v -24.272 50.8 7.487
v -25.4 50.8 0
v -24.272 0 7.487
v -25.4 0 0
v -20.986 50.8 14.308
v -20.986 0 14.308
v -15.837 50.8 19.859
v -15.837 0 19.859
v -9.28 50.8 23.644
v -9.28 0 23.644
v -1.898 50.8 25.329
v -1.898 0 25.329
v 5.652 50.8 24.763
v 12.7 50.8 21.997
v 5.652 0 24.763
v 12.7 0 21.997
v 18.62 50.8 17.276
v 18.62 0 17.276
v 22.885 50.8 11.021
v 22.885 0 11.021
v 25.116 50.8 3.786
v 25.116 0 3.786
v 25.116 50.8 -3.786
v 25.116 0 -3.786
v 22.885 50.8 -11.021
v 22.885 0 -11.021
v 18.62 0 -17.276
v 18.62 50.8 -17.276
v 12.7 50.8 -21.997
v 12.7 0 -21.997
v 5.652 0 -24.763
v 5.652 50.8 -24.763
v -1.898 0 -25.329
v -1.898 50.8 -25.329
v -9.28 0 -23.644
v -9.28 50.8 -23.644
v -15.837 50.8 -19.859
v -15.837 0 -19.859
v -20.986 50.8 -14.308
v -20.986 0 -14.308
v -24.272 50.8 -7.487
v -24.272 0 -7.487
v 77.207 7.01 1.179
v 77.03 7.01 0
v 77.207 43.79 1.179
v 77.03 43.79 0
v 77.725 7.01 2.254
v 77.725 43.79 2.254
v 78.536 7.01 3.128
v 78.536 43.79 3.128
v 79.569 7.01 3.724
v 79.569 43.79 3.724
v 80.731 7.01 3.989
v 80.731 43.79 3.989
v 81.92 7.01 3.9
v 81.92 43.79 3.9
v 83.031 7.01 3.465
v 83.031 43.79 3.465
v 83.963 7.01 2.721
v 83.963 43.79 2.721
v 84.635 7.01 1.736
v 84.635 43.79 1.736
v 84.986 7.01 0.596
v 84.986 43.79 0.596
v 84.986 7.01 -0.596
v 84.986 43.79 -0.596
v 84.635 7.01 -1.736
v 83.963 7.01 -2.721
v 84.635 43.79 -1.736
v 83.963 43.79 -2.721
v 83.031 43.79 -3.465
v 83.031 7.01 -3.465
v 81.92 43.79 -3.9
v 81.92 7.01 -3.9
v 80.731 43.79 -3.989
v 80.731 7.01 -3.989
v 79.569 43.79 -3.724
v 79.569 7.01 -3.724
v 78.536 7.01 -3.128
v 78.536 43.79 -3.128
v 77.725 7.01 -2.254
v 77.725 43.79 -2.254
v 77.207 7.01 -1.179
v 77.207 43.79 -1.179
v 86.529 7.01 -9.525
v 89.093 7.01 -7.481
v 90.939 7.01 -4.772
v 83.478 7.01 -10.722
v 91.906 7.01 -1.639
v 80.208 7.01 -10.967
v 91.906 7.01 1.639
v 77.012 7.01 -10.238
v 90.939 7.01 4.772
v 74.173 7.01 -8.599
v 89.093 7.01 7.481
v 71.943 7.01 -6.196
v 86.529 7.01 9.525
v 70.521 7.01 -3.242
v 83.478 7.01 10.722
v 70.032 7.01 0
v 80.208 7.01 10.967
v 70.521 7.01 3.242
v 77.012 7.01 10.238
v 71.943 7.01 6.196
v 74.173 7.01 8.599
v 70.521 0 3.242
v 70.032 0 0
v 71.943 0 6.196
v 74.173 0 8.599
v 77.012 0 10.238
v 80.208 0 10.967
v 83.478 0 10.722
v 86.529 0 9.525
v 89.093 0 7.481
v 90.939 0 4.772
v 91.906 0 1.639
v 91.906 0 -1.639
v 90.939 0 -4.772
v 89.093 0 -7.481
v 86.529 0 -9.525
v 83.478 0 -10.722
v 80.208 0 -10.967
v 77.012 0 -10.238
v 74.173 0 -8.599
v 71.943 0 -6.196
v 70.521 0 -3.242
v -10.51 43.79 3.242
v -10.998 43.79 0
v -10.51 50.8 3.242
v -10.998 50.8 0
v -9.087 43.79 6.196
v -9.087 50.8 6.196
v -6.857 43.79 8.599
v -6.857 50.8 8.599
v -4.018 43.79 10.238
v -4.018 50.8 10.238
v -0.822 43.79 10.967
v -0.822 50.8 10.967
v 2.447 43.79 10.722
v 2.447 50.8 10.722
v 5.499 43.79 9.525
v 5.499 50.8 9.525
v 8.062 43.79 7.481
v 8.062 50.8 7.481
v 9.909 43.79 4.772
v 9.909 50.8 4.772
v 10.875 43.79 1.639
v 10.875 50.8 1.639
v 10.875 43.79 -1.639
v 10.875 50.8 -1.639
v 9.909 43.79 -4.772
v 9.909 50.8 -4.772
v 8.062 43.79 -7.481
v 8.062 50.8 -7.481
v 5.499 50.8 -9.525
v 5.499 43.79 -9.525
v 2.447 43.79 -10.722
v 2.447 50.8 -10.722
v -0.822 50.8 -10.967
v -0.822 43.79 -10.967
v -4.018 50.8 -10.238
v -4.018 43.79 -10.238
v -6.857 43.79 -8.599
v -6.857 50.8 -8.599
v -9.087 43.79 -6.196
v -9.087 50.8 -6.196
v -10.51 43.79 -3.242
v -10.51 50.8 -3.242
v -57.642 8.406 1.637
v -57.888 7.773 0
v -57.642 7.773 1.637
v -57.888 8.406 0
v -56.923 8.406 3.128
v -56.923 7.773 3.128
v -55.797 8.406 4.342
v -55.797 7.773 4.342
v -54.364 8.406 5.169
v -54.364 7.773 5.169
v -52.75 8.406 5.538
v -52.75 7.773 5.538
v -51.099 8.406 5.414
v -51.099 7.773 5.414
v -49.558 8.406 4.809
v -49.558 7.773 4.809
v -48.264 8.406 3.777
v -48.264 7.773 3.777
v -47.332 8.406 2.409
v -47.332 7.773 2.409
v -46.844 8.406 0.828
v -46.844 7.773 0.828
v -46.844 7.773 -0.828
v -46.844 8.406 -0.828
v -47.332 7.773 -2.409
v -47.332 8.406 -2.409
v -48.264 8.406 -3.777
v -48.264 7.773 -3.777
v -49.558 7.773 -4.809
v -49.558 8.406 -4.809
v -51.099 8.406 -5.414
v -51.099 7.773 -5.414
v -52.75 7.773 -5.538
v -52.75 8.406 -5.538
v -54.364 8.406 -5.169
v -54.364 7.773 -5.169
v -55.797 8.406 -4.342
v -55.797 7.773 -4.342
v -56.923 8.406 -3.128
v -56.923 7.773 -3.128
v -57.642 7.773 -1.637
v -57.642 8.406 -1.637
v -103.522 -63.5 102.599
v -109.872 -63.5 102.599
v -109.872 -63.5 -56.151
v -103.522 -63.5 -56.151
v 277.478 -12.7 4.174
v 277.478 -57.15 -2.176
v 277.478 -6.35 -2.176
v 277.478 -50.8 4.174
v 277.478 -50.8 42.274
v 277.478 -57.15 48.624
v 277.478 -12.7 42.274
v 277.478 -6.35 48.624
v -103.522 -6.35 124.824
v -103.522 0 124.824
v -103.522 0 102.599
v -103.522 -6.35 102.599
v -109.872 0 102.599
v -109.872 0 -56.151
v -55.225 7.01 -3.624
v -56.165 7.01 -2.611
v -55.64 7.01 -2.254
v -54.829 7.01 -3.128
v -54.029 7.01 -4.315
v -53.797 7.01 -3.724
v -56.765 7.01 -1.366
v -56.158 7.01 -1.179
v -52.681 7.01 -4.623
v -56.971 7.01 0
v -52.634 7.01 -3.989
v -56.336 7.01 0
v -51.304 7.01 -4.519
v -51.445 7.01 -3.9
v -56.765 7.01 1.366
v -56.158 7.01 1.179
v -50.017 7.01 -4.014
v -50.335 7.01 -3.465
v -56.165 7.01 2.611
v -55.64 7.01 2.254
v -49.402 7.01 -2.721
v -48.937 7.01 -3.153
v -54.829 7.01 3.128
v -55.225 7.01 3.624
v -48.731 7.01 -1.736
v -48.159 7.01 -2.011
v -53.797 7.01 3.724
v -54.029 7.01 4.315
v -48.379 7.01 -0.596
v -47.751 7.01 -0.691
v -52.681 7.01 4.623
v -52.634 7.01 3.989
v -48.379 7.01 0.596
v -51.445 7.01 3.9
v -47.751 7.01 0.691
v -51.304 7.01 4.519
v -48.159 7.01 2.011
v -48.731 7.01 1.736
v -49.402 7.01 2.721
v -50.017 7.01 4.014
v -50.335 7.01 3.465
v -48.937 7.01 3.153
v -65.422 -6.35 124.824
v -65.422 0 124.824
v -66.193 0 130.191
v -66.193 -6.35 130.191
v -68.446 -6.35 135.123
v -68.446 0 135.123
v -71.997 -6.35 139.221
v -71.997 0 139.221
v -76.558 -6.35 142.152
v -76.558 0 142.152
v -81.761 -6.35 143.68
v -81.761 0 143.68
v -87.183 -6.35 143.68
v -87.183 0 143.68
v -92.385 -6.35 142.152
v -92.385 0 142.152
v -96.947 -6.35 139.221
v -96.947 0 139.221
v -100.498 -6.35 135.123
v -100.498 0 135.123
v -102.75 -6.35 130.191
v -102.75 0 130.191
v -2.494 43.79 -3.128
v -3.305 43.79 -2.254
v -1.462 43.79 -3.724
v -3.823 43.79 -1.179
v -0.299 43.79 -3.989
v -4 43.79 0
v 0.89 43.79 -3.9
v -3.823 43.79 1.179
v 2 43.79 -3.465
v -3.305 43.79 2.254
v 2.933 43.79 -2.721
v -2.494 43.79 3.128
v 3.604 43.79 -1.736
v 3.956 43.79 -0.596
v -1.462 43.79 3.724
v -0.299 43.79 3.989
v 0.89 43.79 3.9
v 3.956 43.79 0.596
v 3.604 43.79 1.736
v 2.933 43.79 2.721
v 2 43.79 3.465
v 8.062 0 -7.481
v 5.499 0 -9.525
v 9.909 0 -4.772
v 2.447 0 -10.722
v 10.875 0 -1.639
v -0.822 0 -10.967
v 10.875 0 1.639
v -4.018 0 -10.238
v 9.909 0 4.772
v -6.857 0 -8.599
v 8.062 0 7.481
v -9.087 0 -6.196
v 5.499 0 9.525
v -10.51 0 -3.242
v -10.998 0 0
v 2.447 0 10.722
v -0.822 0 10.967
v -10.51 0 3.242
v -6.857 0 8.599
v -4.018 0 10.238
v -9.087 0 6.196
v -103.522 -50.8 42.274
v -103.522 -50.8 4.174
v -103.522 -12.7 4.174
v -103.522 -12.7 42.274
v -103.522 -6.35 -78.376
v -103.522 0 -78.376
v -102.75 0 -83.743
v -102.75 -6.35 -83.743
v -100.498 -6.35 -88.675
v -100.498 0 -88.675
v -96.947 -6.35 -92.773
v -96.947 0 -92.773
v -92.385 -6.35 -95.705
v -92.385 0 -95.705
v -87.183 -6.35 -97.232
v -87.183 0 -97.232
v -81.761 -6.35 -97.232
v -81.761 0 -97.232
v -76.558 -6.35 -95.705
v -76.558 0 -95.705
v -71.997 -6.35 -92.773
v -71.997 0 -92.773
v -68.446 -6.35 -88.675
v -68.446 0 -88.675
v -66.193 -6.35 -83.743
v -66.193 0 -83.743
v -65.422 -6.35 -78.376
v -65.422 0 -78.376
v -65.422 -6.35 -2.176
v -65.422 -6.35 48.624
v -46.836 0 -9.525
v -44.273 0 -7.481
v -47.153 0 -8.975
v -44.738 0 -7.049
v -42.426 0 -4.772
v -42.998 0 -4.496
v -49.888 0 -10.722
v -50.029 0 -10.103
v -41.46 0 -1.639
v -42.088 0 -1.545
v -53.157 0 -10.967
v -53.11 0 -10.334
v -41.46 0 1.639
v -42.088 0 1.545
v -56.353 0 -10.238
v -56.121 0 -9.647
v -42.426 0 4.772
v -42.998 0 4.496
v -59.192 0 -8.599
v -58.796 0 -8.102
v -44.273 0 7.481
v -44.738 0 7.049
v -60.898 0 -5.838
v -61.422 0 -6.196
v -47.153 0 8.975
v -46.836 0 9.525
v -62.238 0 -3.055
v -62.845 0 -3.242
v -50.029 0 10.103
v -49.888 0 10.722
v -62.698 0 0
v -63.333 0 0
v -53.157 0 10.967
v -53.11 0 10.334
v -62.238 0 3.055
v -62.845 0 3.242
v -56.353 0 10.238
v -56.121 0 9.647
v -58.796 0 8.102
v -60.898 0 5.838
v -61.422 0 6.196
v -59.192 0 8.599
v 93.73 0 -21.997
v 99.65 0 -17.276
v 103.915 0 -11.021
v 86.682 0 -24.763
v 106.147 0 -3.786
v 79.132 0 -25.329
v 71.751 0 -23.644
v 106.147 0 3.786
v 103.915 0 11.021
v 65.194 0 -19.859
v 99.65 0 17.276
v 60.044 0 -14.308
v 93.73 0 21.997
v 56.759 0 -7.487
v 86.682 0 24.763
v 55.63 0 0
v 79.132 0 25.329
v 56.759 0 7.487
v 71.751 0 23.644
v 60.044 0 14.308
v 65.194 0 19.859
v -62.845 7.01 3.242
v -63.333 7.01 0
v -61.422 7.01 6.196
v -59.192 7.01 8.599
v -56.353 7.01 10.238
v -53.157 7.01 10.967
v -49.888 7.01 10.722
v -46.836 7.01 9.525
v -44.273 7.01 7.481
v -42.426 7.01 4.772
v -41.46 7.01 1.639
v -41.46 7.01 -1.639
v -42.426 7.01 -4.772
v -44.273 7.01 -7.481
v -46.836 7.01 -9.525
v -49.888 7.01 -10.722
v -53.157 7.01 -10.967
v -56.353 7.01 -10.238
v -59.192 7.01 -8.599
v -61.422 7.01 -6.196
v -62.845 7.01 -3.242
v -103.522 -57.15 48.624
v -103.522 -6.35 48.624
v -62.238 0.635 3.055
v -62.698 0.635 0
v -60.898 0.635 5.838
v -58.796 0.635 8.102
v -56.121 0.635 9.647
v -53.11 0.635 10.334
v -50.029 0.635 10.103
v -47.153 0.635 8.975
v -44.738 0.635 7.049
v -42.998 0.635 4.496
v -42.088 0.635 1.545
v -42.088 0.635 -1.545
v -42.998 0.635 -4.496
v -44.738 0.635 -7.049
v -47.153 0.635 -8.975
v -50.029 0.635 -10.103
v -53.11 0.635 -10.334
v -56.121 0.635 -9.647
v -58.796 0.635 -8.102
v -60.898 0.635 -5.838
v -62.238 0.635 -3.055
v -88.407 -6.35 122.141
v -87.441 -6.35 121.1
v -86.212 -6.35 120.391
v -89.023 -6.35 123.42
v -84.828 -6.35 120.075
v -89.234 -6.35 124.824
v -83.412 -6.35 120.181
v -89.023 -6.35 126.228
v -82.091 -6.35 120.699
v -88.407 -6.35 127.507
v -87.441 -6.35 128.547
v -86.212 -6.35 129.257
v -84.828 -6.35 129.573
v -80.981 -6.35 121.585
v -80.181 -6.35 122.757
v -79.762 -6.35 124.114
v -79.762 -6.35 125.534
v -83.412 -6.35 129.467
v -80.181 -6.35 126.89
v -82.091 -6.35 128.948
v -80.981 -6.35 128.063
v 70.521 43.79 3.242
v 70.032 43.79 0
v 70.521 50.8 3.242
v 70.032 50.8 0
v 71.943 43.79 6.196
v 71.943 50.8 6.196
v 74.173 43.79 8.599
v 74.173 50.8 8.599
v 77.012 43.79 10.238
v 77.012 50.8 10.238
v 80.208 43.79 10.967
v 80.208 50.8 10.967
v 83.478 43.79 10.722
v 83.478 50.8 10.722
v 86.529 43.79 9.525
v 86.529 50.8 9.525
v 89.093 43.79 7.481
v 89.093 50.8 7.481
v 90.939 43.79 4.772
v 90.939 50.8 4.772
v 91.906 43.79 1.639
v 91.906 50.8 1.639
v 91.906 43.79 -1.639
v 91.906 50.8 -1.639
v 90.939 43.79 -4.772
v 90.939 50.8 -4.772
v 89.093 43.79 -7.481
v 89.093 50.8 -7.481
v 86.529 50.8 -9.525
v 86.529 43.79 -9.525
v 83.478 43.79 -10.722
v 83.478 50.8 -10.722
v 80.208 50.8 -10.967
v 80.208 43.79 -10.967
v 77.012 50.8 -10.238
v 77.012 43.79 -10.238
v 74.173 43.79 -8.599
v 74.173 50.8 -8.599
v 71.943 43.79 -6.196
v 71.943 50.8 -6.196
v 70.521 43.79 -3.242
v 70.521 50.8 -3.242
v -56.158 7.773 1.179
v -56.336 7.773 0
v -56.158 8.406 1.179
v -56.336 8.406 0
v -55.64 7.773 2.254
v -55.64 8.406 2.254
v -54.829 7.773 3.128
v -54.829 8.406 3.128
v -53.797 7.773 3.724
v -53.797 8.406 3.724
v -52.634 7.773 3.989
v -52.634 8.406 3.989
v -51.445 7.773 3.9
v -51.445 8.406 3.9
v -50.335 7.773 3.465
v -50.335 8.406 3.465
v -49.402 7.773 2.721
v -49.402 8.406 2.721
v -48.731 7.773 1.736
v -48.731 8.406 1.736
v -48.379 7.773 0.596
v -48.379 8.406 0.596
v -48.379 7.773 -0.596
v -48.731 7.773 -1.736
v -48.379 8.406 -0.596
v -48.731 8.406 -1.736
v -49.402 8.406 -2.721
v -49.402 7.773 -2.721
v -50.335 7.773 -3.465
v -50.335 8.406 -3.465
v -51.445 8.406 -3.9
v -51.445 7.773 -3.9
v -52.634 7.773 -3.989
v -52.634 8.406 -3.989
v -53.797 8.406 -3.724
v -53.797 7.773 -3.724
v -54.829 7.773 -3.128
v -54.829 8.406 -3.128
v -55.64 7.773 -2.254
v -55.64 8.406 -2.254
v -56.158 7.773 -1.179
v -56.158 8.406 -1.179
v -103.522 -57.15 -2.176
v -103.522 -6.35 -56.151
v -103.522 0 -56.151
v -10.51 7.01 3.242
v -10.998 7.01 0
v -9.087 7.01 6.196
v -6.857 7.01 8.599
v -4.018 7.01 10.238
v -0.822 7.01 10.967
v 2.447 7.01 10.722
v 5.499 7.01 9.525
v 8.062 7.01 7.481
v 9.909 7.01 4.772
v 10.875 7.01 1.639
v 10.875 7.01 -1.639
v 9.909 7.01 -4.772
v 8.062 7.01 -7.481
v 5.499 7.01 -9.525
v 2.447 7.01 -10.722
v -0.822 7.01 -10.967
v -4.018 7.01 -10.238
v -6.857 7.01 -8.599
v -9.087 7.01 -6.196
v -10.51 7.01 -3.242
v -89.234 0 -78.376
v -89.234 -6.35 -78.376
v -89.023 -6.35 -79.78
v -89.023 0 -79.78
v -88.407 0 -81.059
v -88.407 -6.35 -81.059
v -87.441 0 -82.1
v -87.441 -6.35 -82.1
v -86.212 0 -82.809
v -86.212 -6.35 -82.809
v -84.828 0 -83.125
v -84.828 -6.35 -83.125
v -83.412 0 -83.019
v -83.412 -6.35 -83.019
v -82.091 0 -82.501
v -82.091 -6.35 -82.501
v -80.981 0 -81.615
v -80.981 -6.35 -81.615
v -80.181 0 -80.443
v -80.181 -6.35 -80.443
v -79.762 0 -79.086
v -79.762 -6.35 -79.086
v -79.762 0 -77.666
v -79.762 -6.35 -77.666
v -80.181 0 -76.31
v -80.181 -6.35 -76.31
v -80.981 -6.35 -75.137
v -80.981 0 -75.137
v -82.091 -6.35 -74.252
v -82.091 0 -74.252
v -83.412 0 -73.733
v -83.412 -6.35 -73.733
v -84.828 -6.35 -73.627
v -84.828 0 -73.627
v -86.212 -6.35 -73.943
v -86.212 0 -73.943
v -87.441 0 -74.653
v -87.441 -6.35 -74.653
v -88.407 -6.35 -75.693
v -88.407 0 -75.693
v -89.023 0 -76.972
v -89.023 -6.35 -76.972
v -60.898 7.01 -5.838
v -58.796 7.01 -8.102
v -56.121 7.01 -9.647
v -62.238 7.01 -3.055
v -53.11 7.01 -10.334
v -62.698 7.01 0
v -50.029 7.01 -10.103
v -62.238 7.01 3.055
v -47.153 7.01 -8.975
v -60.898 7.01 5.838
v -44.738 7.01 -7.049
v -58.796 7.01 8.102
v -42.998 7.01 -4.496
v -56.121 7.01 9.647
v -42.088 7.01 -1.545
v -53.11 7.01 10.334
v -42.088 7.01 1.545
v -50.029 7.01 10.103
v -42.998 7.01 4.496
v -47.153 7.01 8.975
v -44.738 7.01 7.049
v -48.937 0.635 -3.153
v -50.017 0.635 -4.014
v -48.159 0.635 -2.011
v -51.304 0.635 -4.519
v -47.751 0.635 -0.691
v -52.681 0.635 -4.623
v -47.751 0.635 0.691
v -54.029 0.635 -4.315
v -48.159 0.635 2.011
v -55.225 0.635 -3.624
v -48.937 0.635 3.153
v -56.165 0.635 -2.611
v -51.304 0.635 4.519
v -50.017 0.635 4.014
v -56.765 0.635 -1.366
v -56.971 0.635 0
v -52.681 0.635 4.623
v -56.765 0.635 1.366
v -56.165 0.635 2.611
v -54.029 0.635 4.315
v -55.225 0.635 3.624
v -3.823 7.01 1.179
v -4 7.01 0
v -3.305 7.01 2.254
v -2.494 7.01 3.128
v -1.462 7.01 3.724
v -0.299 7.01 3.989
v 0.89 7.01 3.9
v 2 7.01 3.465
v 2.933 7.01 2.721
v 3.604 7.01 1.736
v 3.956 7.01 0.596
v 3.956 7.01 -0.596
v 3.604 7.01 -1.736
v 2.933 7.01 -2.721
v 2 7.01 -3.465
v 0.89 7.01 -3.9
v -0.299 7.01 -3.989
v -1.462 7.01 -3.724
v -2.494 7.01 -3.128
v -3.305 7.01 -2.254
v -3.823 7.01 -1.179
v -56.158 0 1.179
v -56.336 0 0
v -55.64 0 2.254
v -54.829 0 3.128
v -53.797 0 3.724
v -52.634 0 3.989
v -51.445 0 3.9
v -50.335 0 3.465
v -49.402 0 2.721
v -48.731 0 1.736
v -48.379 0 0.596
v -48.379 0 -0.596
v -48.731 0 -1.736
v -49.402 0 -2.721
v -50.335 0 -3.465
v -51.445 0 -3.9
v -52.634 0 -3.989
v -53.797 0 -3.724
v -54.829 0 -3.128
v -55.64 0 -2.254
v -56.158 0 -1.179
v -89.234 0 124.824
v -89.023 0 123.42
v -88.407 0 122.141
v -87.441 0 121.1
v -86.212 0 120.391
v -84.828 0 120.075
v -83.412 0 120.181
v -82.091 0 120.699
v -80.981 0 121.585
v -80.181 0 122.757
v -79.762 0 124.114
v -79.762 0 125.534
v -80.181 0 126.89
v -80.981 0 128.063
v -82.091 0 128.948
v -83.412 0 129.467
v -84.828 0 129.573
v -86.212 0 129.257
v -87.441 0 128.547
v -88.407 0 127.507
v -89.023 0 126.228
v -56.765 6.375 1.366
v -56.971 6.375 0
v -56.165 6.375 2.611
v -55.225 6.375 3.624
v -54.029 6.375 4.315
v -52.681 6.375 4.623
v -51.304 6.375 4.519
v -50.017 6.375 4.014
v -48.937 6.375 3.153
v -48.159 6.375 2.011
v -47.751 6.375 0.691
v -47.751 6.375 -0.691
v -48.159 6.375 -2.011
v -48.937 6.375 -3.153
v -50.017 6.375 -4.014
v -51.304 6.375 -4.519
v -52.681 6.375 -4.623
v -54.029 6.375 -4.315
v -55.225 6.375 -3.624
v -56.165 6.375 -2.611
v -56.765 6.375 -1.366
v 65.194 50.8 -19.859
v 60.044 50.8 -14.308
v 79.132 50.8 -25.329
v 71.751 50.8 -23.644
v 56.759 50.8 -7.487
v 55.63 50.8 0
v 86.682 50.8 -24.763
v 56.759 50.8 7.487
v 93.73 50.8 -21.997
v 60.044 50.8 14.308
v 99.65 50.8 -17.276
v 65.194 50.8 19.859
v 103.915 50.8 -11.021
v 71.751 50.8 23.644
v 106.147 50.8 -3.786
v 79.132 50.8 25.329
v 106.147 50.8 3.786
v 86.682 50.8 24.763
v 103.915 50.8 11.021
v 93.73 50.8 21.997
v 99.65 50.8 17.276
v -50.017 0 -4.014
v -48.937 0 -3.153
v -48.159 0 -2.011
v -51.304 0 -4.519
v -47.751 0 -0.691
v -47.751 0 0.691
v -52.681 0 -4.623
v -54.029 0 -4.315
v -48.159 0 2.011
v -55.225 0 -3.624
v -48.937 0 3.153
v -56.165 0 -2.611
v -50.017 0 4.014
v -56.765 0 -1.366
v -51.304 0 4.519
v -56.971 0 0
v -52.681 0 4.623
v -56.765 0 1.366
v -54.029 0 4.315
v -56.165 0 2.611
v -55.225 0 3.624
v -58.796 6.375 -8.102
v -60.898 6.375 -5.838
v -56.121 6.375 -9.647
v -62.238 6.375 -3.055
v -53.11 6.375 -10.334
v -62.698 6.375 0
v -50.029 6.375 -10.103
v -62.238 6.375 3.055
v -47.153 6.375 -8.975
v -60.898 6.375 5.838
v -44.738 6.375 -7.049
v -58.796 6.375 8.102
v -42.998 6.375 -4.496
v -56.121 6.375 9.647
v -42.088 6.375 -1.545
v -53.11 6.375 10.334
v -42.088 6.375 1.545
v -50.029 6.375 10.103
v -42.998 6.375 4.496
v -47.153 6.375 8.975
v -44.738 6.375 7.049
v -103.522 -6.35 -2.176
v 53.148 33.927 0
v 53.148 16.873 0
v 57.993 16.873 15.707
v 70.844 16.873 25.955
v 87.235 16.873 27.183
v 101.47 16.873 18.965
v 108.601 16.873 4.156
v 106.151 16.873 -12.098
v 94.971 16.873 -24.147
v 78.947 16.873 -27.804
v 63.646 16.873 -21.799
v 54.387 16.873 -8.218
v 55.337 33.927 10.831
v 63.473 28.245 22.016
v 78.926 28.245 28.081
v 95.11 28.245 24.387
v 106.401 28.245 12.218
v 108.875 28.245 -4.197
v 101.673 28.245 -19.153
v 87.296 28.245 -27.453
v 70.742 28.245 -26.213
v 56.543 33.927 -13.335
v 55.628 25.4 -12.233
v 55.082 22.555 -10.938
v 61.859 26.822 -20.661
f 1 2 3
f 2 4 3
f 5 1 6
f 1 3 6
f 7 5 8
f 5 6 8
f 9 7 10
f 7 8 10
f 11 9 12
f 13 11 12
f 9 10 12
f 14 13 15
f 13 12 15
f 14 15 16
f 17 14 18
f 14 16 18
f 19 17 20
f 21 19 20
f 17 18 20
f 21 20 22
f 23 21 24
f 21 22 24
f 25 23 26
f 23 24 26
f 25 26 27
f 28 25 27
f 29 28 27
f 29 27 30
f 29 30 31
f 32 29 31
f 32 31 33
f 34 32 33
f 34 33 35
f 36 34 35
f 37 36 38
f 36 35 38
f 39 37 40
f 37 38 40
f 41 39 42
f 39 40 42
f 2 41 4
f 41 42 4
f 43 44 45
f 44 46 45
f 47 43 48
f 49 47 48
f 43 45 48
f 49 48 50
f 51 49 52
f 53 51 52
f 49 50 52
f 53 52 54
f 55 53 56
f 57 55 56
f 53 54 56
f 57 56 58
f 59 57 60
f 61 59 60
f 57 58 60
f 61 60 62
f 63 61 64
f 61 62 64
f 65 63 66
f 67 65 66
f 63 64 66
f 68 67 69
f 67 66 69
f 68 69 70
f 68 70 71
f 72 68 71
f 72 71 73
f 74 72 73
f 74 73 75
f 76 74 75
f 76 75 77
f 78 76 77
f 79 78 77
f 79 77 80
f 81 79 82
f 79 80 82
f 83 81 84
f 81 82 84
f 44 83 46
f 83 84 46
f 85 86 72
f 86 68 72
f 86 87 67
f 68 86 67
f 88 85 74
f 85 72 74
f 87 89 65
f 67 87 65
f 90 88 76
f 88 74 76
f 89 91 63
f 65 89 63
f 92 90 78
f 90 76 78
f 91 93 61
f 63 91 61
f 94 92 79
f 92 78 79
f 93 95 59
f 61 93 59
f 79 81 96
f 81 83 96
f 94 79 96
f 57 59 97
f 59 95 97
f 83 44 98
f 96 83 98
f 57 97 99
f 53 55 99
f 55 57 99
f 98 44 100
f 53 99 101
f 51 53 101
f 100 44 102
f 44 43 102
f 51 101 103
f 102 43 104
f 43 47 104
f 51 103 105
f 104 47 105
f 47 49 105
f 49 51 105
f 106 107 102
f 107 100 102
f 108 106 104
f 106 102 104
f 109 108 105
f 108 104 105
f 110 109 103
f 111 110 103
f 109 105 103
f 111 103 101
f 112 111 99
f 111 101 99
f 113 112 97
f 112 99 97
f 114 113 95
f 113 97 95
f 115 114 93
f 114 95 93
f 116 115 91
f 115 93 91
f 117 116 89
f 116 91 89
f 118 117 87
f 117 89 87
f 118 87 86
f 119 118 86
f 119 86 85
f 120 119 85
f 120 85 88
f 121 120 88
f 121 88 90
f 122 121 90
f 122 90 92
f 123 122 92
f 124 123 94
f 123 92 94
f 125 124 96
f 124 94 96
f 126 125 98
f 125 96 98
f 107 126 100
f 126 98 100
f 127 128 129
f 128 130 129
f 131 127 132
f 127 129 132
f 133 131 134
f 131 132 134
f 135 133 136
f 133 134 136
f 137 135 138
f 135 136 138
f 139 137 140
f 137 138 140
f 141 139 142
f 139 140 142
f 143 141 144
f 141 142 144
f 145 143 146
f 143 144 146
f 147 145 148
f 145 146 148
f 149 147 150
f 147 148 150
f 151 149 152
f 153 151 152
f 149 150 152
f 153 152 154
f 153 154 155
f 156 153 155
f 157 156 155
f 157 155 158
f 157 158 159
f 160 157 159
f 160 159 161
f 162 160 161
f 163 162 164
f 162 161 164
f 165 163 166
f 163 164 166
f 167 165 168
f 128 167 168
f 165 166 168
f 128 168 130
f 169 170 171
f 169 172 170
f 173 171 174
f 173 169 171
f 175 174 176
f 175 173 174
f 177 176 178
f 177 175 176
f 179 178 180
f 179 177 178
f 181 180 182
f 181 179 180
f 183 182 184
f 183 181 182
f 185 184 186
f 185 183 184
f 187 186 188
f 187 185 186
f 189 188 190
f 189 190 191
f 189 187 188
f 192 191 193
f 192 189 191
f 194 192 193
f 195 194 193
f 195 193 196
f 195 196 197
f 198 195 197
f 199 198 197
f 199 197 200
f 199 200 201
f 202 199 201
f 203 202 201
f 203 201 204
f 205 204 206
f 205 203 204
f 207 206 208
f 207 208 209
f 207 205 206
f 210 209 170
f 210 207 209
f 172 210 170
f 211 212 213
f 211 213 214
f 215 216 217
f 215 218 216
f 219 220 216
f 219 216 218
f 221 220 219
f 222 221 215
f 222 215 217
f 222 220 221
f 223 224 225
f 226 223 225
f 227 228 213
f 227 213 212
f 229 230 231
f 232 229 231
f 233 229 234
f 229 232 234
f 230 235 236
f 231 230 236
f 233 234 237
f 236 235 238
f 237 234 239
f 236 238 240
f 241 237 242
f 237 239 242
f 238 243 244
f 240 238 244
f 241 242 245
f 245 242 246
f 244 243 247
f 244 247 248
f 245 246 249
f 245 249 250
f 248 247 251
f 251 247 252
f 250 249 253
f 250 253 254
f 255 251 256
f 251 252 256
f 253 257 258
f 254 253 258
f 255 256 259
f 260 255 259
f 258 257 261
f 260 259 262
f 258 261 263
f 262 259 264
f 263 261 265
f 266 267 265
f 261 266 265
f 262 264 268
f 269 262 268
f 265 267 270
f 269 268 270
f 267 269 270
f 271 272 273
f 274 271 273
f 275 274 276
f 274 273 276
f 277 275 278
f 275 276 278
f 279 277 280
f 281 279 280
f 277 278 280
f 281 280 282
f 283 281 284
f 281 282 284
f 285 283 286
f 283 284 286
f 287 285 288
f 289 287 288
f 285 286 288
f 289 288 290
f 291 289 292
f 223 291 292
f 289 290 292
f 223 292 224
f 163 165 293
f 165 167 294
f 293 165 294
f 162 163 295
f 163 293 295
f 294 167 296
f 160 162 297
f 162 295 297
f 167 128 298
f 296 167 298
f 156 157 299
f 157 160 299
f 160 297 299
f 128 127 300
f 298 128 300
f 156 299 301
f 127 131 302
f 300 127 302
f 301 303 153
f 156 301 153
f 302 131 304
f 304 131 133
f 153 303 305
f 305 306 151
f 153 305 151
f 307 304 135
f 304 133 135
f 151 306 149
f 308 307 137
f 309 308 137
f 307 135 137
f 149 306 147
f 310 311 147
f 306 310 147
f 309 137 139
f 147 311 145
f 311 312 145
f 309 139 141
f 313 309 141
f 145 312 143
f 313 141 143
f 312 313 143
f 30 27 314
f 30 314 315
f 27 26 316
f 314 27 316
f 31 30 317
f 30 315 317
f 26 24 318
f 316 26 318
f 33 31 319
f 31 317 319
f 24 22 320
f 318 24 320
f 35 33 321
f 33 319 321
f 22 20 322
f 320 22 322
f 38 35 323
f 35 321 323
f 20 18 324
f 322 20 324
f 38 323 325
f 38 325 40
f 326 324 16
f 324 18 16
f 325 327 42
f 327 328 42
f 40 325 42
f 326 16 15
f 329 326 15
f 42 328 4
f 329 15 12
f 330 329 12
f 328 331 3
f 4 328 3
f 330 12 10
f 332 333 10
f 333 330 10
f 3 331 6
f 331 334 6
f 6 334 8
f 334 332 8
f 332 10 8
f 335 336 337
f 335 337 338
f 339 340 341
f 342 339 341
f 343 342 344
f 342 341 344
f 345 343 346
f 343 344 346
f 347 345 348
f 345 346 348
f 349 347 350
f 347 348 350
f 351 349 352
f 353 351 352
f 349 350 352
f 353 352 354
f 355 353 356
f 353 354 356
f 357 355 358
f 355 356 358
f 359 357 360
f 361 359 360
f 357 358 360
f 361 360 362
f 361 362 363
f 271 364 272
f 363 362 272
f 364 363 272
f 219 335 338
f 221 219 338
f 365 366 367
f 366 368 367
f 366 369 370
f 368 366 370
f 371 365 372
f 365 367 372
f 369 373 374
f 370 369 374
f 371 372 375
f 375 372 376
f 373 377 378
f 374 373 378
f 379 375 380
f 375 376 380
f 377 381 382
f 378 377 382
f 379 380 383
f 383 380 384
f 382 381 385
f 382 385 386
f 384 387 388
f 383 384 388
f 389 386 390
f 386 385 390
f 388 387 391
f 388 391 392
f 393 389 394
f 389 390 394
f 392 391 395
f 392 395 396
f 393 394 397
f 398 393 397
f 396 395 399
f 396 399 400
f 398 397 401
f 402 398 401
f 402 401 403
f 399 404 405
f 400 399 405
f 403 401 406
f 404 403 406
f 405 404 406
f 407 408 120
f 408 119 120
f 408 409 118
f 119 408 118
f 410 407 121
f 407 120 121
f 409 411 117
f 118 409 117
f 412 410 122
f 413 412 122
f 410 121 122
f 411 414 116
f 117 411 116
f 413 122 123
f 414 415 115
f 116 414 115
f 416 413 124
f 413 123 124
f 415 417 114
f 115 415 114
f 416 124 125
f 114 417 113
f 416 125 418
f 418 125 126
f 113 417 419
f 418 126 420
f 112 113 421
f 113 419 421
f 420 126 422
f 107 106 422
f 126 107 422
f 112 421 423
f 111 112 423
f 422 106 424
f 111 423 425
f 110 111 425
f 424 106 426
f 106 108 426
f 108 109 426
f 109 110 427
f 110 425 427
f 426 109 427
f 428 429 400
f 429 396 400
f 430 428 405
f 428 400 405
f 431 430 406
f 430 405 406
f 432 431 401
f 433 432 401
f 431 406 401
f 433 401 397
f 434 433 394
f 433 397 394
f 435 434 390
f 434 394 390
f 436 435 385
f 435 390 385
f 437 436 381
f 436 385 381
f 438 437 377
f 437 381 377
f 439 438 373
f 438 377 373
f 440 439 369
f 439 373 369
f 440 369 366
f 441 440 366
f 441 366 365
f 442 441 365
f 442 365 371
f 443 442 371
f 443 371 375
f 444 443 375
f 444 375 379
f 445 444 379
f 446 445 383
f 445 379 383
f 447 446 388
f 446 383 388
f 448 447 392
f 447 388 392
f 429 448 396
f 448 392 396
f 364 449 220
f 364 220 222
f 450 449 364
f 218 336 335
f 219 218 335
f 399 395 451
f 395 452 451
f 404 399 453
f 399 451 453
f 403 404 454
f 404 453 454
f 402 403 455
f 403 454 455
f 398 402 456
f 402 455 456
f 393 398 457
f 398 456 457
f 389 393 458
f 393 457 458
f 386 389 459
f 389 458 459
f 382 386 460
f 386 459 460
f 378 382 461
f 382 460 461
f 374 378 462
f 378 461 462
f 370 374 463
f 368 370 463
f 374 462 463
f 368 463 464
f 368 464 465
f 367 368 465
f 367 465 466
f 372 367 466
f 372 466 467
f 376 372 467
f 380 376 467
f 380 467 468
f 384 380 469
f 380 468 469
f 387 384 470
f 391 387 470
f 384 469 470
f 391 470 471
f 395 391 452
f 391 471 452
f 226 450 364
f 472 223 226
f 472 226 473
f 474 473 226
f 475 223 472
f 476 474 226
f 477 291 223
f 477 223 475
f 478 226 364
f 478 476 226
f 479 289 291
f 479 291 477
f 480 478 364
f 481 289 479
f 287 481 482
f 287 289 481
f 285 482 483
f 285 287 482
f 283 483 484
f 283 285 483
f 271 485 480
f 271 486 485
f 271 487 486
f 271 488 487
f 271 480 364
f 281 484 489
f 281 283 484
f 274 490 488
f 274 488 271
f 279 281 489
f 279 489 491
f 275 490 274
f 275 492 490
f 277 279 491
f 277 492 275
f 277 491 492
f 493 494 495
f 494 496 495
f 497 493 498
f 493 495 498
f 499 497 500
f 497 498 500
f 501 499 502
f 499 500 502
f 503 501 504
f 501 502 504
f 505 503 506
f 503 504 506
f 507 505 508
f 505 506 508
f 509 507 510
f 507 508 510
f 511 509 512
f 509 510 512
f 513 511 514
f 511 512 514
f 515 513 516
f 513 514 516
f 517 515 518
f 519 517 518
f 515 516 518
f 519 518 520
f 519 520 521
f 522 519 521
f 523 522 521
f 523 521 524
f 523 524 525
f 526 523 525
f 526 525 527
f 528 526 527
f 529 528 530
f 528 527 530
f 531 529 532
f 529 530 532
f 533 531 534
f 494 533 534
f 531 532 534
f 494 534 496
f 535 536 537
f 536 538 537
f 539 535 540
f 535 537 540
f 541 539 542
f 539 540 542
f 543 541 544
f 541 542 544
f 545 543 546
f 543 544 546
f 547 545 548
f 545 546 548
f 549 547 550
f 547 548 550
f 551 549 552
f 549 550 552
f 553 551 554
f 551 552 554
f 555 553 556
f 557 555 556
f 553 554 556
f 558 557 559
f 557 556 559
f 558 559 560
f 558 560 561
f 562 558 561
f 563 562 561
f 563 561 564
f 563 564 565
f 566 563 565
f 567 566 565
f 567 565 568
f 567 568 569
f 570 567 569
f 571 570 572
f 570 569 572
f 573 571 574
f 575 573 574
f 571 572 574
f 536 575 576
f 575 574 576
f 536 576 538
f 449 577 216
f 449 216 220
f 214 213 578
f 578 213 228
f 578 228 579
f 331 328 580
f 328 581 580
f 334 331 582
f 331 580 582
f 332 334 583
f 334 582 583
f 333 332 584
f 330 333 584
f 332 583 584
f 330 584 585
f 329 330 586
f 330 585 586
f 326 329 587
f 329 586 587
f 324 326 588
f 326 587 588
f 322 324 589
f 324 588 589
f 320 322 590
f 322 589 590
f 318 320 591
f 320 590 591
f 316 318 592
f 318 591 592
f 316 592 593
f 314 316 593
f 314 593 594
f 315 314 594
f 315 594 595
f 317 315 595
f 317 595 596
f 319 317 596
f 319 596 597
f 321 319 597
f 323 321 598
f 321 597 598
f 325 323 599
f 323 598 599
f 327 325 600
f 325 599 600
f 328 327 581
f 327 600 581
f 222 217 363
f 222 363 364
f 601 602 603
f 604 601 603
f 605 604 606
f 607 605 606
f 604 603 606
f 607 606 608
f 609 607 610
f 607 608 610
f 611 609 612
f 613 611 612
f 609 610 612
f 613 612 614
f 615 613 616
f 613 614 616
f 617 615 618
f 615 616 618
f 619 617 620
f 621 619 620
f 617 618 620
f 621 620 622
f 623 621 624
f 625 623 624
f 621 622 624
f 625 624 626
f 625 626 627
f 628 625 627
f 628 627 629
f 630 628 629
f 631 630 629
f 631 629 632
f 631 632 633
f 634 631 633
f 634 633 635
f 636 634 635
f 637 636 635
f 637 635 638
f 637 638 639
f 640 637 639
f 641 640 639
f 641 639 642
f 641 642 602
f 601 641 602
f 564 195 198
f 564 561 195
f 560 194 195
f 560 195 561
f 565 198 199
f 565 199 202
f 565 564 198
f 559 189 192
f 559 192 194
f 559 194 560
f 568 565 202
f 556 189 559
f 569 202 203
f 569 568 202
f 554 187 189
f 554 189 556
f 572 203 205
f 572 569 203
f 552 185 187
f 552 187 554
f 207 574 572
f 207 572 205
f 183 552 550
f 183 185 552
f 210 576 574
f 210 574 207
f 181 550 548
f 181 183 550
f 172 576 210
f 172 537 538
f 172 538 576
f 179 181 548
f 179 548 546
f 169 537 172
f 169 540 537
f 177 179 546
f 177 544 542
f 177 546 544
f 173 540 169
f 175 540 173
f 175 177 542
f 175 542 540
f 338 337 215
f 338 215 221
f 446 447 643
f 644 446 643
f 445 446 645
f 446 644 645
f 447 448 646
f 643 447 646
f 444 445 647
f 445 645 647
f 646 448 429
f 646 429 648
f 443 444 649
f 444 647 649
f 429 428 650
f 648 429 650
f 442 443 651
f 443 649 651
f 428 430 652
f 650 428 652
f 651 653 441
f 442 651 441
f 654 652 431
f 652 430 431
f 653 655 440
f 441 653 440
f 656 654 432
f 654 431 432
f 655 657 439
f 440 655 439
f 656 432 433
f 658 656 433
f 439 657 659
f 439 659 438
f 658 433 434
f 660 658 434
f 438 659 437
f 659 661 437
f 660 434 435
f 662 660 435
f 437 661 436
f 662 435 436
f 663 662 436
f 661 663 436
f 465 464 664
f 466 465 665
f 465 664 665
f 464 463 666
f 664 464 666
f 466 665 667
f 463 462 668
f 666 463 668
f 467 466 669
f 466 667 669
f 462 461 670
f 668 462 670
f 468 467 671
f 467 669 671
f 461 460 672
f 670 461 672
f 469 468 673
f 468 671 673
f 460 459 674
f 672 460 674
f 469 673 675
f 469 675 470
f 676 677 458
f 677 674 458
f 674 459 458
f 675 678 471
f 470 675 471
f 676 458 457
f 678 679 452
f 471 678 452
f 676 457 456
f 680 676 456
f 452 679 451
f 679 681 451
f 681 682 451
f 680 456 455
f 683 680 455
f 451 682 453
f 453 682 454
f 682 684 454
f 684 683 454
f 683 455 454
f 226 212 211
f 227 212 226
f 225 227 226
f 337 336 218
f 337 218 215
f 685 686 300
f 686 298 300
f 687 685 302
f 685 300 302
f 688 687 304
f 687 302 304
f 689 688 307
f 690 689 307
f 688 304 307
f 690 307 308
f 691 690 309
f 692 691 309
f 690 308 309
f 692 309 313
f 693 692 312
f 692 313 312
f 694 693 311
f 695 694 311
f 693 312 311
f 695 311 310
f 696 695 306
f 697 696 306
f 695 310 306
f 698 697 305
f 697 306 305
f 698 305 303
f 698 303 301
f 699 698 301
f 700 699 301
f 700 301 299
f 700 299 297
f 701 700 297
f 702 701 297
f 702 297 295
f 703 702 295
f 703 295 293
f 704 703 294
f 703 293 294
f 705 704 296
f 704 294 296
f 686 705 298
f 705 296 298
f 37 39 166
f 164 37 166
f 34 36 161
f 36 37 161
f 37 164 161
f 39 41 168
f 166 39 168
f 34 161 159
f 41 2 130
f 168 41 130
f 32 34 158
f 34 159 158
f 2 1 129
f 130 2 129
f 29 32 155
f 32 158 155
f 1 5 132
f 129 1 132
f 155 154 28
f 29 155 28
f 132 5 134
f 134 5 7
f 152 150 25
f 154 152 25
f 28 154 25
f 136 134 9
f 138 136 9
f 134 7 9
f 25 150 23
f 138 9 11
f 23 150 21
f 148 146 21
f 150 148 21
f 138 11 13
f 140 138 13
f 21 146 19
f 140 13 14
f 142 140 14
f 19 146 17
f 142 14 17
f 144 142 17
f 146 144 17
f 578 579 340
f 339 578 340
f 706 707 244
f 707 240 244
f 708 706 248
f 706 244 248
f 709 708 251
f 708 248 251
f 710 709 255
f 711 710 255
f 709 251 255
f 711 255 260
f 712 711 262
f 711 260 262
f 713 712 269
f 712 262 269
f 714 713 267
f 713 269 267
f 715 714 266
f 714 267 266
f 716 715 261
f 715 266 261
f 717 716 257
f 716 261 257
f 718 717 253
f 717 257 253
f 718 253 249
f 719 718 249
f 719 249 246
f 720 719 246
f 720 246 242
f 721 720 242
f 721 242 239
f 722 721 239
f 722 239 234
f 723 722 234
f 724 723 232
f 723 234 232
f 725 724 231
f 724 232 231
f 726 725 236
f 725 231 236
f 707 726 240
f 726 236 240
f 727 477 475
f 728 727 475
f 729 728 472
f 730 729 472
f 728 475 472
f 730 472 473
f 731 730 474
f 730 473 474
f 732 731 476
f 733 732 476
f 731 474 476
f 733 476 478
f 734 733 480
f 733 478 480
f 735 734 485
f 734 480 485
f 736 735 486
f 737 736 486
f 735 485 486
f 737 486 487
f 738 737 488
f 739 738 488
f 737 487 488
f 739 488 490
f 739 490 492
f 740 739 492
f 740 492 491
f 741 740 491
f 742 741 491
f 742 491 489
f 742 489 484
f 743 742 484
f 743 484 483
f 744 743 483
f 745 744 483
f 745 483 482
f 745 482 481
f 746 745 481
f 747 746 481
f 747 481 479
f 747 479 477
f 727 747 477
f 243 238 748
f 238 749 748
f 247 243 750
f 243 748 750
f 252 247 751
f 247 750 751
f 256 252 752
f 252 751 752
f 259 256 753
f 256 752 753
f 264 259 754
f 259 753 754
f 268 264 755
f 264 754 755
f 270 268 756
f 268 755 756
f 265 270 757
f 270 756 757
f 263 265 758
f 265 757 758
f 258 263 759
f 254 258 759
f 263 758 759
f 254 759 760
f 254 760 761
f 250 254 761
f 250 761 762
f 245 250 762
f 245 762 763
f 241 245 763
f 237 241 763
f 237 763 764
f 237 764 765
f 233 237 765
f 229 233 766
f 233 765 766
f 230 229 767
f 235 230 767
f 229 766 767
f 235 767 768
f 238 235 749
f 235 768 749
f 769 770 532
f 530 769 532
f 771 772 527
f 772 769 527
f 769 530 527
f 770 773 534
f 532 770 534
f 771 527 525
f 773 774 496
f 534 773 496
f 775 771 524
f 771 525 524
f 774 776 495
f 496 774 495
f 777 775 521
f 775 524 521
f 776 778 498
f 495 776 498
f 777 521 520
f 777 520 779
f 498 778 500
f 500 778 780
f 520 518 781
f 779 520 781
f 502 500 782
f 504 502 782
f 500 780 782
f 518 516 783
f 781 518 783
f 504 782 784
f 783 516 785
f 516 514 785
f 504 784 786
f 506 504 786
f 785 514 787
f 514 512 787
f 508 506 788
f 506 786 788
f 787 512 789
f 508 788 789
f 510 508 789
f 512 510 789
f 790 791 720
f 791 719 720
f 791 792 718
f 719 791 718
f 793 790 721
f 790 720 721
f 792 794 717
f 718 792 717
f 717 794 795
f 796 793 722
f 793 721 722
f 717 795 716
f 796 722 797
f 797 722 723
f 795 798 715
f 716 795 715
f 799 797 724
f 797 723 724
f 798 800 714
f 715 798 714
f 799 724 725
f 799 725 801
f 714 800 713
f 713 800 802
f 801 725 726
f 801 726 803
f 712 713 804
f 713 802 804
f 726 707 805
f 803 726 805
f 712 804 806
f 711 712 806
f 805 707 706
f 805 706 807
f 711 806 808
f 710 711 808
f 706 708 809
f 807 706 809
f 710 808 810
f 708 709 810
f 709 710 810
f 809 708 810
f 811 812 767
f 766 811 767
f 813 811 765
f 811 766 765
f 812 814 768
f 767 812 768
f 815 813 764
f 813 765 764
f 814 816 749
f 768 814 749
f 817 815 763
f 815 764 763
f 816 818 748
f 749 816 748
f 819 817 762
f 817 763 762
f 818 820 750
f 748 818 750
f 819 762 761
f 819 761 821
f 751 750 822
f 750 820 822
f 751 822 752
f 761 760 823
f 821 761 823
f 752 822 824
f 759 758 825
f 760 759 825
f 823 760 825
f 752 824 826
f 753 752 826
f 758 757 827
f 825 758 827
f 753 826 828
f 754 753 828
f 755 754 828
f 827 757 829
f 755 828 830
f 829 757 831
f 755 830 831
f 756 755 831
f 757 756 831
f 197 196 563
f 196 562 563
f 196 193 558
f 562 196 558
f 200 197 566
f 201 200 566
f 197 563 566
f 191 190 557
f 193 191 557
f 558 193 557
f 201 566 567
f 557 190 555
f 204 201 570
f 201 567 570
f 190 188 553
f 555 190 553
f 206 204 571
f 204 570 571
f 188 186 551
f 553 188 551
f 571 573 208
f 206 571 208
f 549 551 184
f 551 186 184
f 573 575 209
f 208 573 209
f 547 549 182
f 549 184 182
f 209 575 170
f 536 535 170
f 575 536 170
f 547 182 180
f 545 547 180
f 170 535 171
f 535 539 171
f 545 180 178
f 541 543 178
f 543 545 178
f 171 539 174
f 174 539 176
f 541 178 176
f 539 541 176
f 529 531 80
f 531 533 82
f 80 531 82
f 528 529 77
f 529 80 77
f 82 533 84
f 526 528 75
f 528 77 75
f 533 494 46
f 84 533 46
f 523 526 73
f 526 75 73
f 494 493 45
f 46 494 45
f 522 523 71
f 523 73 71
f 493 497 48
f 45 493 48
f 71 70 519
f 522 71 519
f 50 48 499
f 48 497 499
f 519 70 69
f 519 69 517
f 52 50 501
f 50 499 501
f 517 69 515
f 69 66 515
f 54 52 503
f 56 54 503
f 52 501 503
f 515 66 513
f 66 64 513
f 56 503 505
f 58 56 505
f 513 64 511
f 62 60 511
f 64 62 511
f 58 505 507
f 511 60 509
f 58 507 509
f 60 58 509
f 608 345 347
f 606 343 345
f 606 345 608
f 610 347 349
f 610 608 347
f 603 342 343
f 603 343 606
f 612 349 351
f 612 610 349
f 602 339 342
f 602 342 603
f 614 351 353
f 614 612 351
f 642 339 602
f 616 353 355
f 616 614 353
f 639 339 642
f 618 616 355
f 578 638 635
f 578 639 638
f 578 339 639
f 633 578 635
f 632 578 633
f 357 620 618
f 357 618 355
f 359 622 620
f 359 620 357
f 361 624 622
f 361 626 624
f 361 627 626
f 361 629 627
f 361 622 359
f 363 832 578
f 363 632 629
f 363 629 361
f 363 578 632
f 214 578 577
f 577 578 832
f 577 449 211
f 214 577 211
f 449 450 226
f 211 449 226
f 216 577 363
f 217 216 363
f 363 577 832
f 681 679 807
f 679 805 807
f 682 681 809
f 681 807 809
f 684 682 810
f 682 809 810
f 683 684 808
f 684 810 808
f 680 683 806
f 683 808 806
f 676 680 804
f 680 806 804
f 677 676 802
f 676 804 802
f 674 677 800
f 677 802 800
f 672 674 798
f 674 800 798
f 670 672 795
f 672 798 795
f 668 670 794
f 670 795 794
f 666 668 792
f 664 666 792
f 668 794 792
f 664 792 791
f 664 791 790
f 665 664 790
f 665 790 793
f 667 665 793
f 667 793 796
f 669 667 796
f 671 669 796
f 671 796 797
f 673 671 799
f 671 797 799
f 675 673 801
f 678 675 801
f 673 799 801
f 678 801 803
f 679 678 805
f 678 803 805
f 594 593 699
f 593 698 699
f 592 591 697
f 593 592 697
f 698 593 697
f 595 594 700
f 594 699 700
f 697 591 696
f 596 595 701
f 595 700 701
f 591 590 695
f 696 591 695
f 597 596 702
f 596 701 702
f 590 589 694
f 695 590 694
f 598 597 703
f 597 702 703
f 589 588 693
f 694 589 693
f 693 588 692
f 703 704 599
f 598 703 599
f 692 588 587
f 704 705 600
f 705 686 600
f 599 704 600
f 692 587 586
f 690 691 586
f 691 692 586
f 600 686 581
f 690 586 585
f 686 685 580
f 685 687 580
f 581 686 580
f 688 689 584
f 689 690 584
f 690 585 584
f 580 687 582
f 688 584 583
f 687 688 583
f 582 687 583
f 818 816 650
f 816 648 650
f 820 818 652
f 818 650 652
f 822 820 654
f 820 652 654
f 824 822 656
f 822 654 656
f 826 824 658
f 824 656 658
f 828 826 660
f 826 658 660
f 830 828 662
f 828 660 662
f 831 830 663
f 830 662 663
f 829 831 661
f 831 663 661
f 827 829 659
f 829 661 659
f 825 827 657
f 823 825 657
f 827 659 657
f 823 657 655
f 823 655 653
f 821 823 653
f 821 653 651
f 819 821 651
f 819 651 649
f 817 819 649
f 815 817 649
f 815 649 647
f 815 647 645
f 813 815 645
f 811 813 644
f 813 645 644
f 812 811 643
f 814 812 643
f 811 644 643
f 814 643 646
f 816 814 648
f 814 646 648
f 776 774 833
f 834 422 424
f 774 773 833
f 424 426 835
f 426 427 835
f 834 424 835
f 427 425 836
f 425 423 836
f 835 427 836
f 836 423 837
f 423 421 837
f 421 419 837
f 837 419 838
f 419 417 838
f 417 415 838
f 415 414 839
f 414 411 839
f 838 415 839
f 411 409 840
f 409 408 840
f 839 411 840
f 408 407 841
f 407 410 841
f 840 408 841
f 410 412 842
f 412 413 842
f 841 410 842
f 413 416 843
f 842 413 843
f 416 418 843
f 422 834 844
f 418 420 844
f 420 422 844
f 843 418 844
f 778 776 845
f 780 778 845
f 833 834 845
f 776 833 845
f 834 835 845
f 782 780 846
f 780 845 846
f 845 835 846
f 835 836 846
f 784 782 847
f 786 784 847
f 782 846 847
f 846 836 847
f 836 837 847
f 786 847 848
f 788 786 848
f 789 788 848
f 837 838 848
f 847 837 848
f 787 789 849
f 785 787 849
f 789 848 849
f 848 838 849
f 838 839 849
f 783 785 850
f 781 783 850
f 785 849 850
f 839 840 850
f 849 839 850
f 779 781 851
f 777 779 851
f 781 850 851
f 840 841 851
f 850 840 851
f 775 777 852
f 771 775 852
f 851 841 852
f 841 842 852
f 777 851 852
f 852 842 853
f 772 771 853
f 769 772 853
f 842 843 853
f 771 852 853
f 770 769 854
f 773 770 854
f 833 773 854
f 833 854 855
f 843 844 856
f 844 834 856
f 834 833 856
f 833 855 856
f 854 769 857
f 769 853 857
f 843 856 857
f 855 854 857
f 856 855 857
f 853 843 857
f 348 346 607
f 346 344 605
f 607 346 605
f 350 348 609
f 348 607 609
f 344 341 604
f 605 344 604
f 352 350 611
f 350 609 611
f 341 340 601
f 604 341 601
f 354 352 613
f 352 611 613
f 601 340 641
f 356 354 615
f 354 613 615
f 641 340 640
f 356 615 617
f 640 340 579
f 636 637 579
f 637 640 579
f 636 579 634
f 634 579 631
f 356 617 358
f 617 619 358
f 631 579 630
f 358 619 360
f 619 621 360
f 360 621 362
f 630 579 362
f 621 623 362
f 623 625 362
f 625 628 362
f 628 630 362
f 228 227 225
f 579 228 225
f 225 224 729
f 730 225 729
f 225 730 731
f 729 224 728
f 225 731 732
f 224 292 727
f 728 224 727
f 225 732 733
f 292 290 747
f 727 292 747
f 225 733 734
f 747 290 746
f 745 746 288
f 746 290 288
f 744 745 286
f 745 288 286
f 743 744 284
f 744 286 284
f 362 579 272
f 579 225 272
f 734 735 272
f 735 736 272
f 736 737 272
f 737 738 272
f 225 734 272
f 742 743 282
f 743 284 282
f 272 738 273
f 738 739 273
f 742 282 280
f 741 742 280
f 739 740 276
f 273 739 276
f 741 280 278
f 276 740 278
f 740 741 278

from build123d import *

# Parameters (mm, degrees)
F0_W     = 6.35
F0_H     = 158.75
F1_DEPTH = 63.5
F2_DEPTH = 6.35
F3_D     = 9.525
F4_W     = 50.8
F4_H     = 50.8
F4_W_2   = 38.0999987721
F4_H_2   = 38.0999987721
F5_DEPTH = 381
F10_W    = 1.5527821722
F10_H    = 0.6326977164


with BuildPart() as f1:
    # F0 (on Front) → F1 (new body)
    with BuildSketch(Plane.XZ):
        with Locations((-106.6967696309, 23.2238343884)):
            Rectangle(F0_W, F0_H)
    extrude(amount=F1_DEPTH)

    # F0 (on Front) → F2 (join)
    with BuildSketch(Plane.XZ):
        with BuildLine():
            Line((-103.5217696309, 102.5988343884), (-103.5217696309, -56.1511656116))
            Line((-103.5217696309, -56.1511656116), (-103.5217696309, -78.3761656116))
            ThreePointArc((-103.5217696309, -78.3761656116), (-84.4717696309, -97.4261656116), (-65.4217696309, -78.3761656116))
            Line((-65.4217696309, -78.3761656116), (-65.4217696309, 124.8238343884))
            ThreePointArc((-65.4217696309, 124.8238343884), (-84.4717696309, 143.8738343884), (-103.5217696309, 124.8238343884))
            Line((-103.5217696309, 124.8238343884), (-103.5217696309, 102.5988343884))
        make_face()
    extrude(amount=F2_DEPTH)

    # F3 (through all)
    with Locations(Plane(origin=(0, 0, 0), x_dir=(1, 0, 0), z_dir=(0, 1, 0))):
        with Locations((-84.4717696309, 78.3761656116), (-84.4717696309, -124.8238343884)):
            Hole(F3_D / 2)

    # F4 (on face) → F5 (join)
    with BuildSketch(Plane.YZ.offset(-103.5217696309)):
        with Locations((-31.75, 23.2238343884)):
            Rectangle(F4_W, F4_H)
        with Locations((-31.75, 23.2238343884)):
            Rectangle(F4_W_2, F4_H_2, mode=Mode.SUBTRACT)
    extrude(amount=F5_DEPTH)


with BuildPart() as f7:
    # F6 (on Top) → F7 (revolve)
    with BuildSketch(Plane.XY):
        Polygon((-25.4, 50.8), (-25.4, 0), (-10.9982, 0), (-10.9982, 7.0104), (-4.0005, 7.0104), (-4.0005, 43.7896), (-10.9982, 43.7896), (-10.9982, 50.8), align=None)
    revolve(axis=Axis((0, 54.4099446642, 0), (0, 1, 0)))


with BuildPart() as f9:
    # F8 (on Top) → F9 (revolve)
    with BuildSketch(Plane.XY):
        with BuildLine():
            ThreePointArc((55.6302515238, 50.8), (52.8362670833, 25.4), (55.6302515238, 0))
            Line((55.6302515238, 0), (70.0320515238, 0))
            Line((70.0320515238, 0), (70.0320515238, 7.0104))
            Line((70.0320515238, 7.0104), (77.0297515238, 7.0104))
            Line((77.0297515238, 7.0104), (77.0297515238, 43.7896))
            Line((77.0297515238, 43.7896), (70.0320515238, 43.7896))
            Line((70.0320515238, 43.7896), (70.0320515238, 50.8))
            Line((70.0320515238, 50.8), (55.6302515238, 50.8))
        make_face()
    revolve(axis=Axis((81.0302515238, 25.4, 0), (0, 1, 0)))


with BuildPart() as f11:
    # F10 (on Top) → F11 (revolve)
    with BuildSketch(Plane.XY):
        Polygon((-56.9705654834, 0), (-56.3355654834, 0), (-56.3355654834, 7.0104), (-56.9705654834, 7.0104), (-56.9705654834, 6.3754), (-62.6982654834, 6.3754), (-62.6982654834, 7.0104), (-63.3332654834, 7.0104), (-63.3332654834, 0), (-62.6982654834, 0), (-62.6982654834, 0.635), (-56.9705654834, 0.635), align=None)
    revolve(axis=Axis((-52.3350654834, 5.8954050789, 0), (0, 1, 0)))


with BuildPart() as f11b:
    # F10 (on Top) → F11, piece 2 (revolve)
    with BuildSketch(Plane.XY):
        with Locations((-57.1119565695, 8.0892900005)):
            Rectangle(F10_W, F10_H)
    revolve(axis=Axis((-52.3350654834, 5.8954050789, 0), (0, 1, 0)))


solid = Compound([f1.part, f7.part, f9.part, f11.part, f11b.part])
